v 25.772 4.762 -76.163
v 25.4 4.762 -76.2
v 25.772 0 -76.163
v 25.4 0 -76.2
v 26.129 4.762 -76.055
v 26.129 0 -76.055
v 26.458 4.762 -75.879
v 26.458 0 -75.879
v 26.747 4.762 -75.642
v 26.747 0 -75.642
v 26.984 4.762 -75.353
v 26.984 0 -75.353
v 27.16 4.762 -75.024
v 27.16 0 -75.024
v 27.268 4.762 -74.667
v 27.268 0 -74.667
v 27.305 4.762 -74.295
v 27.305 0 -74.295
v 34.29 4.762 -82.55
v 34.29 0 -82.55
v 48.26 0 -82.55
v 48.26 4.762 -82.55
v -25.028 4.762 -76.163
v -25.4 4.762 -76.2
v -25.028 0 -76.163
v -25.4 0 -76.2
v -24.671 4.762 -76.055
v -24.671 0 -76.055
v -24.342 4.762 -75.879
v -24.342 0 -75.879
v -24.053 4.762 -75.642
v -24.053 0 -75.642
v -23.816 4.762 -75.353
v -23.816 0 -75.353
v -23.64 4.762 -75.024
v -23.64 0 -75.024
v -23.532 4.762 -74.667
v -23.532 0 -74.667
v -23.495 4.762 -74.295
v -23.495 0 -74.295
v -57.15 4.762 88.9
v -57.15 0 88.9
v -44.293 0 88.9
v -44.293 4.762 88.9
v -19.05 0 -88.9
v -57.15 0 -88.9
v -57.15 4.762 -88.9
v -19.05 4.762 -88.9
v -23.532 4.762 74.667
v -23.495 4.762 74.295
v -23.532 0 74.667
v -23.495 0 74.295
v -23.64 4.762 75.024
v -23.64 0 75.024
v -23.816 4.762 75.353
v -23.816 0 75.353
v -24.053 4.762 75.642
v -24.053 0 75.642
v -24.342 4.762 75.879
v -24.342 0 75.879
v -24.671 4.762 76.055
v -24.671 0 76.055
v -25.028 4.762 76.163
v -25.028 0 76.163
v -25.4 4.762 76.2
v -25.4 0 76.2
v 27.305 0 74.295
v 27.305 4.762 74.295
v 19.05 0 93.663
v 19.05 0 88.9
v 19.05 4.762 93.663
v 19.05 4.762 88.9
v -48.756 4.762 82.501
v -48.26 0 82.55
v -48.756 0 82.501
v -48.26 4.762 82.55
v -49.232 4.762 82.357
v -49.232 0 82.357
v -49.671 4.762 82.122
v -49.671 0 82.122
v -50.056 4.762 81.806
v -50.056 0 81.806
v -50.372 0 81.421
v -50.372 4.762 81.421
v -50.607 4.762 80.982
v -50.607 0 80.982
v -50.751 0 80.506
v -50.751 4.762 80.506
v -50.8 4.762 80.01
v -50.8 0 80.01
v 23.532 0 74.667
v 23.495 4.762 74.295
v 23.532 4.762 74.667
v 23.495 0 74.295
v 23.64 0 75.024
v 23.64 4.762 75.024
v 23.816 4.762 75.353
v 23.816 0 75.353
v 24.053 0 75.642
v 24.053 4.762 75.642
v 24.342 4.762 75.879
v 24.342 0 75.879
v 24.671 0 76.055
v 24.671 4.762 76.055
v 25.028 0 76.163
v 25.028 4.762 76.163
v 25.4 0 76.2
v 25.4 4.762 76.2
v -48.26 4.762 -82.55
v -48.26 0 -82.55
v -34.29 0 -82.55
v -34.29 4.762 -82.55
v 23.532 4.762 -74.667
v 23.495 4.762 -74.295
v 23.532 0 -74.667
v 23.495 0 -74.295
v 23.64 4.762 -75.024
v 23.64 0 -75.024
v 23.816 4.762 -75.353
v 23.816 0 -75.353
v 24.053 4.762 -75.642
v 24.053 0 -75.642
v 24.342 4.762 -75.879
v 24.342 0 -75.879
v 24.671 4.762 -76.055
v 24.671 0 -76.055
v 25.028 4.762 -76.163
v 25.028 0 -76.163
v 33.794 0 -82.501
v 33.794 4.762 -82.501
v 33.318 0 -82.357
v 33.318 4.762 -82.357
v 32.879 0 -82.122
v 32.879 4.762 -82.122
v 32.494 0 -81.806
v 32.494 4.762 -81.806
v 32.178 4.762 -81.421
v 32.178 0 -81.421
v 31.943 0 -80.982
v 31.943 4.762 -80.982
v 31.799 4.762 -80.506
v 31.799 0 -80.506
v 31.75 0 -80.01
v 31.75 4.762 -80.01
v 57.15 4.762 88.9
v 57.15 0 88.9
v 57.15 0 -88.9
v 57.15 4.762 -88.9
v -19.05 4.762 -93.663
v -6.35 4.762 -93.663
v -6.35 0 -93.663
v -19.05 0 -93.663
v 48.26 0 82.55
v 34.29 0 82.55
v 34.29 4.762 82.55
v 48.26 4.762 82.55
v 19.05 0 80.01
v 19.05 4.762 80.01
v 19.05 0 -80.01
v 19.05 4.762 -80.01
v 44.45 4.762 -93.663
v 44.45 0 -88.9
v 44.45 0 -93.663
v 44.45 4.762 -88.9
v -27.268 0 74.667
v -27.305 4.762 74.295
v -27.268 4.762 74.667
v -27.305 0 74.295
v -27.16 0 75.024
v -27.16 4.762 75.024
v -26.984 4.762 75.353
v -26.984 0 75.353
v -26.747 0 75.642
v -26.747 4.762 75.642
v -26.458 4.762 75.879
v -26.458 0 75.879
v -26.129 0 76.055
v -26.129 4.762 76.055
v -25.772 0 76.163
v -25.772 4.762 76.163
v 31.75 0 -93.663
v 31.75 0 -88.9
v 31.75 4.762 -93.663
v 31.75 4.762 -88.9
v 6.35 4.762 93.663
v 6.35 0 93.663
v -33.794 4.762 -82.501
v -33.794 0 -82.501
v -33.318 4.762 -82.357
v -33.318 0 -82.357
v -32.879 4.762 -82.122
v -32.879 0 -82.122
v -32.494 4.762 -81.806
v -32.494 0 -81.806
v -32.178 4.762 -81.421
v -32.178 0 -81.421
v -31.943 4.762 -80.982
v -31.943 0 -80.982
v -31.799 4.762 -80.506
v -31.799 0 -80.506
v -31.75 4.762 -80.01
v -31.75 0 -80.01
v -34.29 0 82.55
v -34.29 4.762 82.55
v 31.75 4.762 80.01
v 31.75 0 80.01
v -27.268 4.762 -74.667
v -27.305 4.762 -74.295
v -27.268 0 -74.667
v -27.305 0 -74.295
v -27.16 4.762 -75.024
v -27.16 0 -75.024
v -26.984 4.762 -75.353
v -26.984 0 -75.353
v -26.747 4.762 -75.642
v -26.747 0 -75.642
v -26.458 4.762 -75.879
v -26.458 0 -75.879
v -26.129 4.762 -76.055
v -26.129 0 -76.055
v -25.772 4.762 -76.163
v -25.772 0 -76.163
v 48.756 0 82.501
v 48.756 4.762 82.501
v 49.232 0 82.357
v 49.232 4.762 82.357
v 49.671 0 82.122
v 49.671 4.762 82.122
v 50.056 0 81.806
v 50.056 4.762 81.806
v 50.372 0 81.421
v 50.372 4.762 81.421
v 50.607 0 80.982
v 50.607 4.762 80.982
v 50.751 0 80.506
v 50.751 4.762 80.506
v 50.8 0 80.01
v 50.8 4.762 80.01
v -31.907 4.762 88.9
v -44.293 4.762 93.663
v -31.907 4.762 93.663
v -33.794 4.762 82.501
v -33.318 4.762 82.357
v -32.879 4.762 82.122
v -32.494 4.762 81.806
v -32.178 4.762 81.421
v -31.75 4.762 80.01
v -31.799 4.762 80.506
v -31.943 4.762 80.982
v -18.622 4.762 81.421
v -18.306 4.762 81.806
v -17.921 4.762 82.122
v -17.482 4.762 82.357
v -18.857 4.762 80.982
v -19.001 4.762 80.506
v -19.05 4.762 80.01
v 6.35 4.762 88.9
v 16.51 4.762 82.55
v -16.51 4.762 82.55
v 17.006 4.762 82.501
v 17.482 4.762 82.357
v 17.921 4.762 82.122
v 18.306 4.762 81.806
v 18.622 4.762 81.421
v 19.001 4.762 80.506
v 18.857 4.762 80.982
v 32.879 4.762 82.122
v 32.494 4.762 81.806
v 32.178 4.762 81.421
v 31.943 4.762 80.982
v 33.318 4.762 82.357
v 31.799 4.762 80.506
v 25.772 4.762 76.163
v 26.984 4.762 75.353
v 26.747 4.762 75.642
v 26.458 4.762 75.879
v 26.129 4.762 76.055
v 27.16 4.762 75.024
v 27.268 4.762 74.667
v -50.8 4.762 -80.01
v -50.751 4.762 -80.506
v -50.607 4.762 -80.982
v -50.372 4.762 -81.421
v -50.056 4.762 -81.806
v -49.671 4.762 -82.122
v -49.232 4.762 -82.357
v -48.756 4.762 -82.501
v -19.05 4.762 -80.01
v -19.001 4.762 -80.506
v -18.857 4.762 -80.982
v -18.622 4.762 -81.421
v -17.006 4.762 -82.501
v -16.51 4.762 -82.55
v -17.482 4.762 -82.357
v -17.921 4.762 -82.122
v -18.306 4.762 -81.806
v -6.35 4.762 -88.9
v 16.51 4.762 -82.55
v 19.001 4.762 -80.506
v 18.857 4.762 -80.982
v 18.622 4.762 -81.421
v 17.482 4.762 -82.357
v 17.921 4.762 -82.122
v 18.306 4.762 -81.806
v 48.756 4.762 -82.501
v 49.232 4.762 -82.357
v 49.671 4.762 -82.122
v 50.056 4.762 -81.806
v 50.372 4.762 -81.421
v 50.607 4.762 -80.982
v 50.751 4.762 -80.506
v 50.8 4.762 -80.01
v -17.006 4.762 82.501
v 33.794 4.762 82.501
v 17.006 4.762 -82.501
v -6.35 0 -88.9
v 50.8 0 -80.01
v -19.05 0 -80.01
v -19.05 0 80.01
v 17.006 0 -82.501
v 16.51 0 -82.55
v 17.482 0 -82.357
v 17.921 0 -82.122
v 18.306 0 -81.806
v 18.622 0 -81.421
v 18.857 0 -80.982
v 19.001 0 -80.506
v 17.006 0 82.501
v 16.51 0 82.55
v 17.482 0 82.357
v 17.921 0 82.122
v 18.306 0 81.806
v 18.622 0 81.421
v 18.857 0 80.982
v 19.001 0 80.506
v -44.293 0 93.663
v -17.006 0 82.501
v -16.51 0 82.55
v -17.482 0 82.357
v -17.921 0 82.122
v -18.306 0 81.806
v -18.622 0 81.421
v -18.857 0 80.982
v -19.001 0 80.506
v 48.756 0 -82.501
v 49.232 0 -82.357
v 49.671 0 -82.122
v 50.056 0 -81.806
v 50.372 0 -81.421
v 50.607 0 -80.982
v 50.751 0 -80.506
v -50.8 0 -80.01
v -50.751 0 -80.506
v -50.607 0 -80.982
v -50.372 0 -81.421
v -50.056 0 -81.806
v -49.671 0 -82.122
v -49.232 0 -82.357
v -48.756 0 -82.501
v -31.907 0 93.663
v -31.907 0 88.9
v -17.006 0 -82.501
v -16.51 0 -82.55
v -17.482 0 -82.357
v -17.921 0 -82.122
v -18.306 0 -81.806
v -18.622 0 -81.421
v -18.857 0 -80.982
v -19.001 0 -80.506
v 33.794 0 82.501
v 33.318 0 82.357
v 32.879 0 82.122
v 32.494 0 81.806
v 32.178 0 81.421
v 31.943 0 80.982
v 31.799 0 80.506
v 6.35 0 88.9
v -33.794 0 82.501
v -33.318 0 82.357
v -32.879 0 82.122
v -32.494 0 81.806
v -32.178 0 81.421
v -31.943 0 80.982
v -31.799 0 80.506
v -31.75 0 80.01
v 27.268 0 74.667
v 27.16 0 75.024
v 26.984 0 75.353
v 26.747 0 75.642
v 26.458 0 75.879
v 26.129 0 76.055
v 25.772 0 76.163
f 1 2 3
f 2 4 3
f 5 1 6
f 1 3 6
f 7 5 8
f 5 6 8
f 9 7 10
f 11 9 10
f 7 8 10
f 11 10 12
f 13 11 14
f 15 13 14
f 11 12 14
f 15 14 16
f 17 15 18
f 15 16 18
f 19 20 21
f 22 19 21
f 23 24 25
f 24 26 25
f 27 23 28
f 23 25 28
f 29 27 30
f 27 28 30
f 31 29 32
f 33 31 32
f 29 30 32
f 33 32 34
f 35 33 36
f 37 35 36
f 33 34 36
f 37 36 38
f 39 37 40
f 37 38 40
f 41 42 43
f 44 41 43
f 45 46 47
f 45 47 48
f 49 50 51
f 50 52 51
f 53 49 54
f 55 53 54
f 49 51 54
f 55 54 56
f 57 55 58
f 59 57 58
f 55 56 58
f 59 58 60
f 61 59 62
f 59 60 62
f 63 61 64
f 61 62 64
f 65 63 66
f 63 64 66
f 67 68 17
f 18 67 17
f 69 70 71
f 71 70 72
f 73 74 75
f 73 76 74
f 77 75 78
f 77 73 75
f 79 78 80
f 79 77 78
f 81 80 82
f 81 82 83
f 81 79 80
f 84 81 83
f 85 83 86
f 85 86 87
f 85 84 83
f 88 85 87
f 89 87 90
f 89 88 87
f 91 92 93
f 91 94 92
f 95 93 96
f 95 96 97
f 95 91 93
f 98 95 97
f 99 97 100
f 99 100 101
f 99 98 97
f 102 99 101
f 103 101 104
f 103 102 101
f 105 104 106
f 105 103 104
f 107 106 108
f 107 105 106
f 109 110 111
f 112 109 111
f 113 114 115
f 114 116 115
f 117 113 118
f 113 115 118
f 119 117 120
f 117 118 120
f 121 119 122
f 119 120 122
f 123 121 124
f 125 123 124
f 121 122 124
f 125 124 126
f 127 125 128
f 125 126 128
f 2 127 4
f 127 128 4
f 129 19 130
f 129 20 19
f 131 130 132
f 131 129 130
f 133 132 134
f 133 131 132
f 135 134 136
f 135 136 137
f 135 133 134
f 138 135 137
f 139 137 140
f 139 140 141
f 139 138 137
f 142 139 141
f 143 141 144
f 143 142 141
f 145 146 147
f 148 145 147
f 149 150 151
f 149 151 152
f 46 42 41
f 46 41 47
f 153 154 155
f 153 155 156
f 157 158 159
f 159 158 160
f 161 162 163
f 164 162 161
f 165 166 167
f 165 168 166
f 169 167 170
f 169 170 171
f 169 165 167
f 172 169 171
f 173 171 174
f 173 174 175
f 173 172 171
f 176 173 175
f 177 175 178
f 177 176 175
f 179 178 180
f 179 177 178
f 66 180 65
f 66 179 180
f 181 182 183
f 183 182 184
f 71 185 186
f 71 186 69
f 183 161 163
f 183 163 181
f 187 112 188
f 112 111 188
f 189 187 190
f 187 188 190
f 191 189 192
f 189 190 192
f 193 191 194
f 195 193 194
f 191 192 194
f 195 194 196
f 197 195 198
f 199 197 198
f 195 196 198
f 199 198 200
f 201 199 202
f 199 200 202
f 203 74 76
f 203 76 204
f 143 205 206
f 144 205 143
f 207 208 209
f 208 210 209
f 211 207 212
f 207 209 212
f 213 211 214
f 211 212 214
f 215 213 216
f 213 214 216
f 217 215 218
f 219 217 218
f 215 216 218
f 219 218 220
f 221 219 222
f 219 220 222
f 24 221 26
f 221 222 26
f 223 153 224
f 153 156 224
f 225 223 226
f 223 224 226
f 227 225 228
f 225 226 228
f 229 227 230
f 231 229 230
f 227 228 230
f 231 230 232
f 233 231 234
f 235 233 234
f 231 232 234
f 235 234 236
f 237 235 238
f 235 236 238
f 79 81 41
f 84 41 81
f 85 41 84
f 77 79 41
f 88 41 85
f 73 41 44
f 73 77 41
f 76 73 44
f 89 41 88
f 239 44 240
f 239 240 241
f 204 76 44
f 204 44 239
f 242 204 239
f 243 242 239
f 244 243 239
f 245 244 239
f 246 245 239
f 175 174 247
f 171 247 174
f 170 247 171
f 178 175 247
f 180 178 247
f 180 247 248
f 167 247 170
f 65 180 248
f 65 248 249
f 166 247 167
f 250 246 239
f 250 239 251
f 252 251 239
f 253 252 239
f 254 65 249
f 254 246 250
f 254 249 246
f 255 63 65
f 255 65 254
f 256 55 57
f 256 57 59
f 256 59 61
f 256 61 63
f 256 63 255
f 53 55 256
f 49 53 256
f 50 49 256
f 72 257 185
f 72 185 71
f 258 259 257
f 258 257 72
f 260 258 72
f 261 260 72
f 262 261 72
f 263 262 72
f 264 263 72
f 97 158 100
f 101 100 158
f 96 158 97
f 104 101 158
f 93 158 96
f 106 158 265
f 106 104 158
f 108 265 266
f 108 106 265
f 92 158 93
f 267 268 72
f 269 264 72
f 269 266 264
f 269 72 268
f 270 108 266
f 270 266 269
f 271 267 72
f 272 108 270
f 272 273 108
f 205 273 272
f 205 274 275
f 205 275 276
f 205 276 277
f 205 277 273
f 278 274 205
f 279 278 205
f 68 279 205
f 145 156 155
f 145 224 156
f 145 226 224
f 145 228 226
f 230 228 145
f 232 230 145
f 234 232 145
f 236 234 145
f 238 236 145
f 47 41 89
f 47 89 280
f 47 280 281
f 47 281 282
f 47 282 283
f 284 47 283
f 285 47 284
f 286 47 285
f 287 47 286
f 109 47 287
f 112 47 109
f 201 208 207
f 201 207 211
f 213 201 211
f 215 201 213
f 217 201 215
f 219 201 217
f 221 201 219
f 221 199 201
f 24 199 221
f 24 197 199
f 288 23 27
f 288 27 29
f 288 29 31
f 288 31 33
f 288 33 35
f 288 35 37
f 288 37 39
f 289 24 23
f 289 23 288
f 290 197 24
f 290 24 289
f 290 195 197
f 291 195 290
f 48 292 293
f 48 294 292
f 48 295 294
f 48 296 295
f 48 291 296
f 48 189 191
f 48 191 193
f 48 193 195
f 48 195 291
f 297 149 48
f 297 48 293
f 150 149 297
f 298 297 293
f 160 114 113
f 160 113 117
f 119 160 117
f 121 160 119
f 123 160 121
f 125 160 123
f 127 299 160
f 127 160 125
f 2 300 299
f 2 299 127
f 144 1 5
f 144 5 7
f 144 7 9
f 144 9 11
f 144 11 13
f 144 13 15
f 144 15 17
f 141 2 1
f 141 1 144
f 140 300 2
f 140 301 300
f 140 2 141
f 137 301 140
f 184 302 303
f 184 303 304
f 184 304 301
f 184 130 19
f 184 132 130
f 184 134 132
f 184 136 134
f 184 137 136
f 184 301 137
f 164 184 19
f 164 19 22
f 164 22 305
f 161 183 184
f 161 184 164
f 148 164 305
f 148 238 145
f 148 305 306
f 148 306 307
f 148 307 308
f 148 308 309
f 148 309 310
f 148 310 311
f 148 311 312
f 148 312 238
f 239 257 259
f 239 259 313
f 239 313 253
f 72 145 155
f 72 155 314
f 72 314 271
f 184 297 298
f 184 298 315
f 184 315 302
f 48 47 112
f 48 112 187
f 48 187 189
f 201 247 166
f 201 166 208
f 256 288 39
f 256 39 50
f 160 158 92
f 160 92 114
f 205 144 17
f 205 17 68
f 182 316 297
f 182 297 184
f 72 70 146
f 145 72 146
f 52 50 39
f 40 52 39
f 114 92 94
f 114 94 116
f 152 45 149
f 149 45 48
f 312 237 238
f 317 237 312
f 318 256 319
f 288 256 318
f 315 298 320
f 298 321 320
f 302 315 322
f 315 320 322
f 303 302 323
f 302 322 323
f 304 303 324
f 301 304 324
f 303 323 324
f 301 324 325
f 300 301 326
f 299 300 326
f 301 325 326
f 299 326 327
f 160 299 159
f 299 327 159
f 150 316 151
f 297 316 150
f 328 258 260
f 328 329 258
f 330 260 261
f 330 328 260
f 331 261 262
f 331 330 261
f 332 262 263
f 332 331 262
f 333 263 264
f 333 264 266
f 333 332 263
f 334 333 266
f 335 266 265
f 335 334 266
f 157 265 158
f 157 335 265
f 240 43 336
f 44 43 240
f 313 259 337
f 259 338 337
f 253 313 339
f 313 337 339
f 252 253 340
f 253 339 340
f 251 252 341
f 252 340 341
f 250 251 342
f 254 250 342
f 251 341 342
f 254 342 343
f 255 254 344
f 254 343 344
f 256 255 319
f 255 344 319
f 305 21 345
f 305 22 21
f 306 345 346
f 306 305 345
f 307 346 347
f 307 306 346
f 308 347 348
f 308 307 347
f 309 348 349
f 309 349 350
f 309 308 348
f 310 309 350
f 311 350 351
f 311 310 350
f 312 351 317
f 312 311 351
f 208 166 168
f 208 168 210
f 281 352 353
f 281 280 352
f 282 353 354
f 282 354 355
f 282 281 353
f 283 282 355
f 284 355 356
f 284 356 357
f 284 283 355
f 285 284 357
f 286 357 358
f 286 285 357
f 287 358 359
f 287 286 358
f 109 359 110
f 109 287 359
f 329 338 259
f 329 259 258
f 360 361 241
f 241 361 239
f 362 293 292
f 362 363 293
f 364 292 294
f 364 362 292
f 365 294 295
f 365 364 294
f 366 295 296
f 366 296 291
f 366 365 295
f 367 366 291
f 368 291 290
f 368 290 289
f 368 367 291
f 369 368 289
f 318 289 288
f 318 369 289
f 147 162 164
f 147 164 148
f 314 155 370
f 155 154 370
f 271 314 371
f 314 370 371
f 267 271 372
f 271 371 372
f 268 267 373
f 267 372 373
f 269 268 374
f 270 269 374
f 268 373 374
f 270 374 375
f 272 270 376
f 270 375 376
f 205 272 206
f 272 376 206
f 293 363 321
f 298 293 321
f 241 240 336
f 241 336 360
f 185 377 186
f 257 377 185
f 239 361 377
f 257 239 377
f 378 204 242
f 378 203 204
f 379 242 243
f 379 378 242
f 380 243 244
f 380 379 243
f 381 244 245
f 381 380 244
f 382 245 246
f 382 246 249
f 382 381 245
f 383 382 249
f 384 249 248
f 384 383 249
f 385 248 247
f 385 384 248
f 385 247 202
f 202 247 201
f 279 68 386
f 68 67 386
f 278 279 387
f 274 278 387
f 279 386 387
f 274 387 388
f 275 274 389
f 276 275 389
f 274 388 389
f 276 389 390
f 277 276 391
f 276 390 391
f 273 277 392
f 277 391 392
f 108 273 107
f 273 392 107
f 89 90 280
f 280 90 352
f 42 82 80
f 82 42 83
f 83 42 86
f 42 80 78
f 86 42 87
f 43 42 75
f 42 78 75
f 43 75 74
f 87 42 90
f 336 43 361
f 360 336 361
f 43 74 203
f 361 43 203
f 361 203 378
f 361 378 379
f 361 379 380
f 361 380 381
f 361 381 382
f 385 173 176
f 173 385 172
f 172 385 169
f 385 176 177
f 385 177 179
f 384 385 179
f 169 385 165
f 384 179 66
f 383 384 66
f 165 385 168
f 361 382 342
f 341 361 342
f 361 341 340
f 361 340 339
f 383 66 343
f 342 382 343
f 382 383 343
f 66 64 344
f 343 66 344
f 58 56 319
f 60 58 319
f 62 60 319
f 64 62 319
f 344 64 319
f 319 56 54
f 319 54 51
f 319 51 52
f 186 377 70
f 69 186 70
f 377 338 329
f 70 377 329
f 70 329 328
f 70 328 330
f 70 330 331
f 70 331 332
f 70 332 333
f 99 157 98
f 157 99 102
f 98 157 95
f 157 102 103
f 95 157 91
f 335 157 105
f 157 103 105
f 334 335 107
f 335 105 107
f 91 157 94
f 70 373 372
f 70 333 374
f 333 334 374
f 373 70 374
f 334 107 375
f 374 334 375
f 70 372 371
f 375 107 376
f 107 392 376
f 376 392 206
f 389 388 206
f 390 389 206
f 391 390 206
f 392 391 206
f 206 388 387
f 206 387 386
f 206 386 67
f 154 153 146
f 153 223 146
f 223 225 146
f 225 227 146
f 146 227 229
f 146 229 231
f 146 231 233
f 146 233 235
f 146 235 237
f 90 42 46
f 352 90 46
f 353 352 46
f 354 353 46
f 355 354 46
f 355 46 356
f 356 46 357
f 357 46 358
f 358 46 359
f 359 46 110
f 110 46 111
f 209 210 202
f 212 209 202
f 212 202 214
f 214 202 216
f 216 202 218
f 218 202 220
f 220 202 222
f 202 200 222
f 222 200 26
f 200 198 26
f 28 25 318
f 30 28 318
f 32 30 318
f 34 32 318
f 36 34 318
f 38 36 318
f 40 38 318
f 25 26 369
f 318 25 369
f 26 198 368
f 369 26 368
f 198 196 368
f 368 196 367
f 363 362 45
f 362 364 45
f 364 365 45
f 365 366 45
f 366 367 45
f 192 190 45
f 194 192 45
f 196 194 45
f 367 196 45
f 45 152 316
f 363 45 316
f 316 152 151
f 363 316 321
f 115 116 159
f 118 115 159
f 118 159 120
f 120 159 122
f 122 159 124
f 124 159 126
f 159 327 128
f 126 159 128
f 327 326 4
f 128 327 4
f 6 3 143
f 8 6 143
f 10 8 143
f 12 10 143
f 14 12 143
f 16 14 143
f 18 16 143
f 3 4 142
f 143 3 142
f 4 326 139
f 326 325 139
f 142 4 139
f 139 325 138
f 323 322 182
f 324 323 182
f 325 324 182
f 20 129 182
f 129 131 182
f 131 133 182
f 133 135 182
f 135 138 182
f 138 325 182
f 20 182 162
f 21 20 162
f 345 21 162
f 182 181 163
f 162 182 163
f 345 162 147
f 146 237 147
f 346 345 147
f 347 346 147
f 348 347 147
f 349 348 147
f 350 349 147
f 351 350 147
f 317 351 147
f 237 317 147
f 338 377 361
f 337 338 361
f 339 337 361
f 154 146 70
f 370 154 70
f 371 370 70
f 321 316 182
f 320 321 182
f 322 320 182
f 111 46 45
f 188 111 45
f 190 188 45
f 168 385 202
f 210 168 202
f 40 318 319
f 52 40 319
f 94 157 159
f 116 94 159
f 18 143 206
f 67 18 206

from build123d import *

# Parameters (mm, degrees)
SKETCH1_W           = 114.3
SKETCH1_H           = 177.8
SKETCH1_W_2         = 101.6
SKETCH1_H_2         = 165.1
BOSS_EXTRUDE1_DEPTH = 4.7625
SKETCH2_W           = 12.38677804
SKETCH2_H           = 4.7625
SKETCH2_W_2         = 12.7
BOSS_EXTRUDE2_DEPTH = 4.7625
SKETCH3_W           = 12.7
SKETCH3_H           = 4.7625
BOSS_EXTRUDE3_DEPTH = 4.7625
FILLET1_R           = 2.54
SKETCH7_W           = 12.7
SKETCH7_H           = 165.1
SKETCH7_W_2         = 3.81
SKETCH7_H_2         = 152.4
BOSS_EXTRUDE6_DEPTH = 4.7625
FILLET3_R           = 2.54
FILLET4_R           = 1.905


with BuildPart() as part:
    # Sketch1 → Boss-Extrude1 (new body)
    with BuildSketch(Plane(origin=(0, 0, 0), x_dir=(1, 0, 0), z_dir=(0, 1, 0))):
        Rectangle(SKETCH1_W, SKETCH1_H)
        Rectangle(SKETCH1_W_2, SKETCH1_H_2, mode=Mode.SUBTRACT)
    extrude(amount=BOSS_EXTRUDE1_DEPTH)

    # Sketch2 → Boss-Extrude2 (add)
    with BuildSketch(Plane.XY.offset(88.9)):
        with Locations((-38.1, 2.38125)):
            Rectangle(SKETCH2_W, SKETCH2_H)
        with Locations((12.7, 2.38125)):
            Rectangle(SKETCH2_W_2, SKETCH2_H)
    extrude(amount=BOSS_EXTRUDE2_DEPTH)

    # Sketch3 → Boss-Extrude3 (add)
    with BuildSketch(Plane(origin=(0, 0, -88.9), x_dir=(-1, 0, 0), z_dir=(0, 0, -1))):
        with Locations((-38.1, 2.38125)):
            Rectangle(SKETCH3_W, SKETCH3_H)
        with Locations((12.7, 2.38125)):
            Rectangle(SKETCH3_W, SKETCH3_H)
    extrude(amount=BOSS_EXTRUDE3_DEPTH)

    # Fillet1
    fillet1_edges = [part.edges().sort_by_distance(p)[0] for p in [
        (50.8, 2.38125, 82.55),
        (50.8, 2.38125, -82.55),
        (-50.8, 2.38125, -82.55),
        (-50.8, 2.38125, 82.55),
    ]]
    fillet(fillet1_edges, radius=FILLET1_R)

    # Sketch7 → Boss-Extrude6 (add)
    # profile 1 of 2: a face of its own
    with BuildSketch(Plane(origin=(0, 4.7625, 0), x_dir=(1, 0, 0), z_dir=(0, 1, 0))):
        with Locations((-25.4, 0)):
            Rectangle(SKETCH7_W, SKETCH7_H)
        with Locations((-25.4, 0)):
            Rectangle(SKETCH7_W_2, SKETCH7_H_2, mode=Mode.SUBTRACT)
    # profile 2 of 2: a face of its own
    with BuildSketch(Plane(origin=(0, 4.7625, 0), x_dir=(1, 0, 0), z_dir=(0, 1, 0))):
        with Locations((25.4, 0)):
            Rectangle(SKETCH7_W, SKETCH7_H)
        with Locations((25.4, 0)):
            Rectangle(SKETCH7_W_2, SKETCH7_H_2, mode=Mode.SUBTRACT)
    extrude(amount=-BOSS_EXTRUDE6_DEPTH)

    # Fillet3
    fillet3_edges = [part.edges().sort_by_distance(p)[0] for p in [
        (-31.75, 2.38125, 82.55),
        (-31.75, 2.38125, -82.55),
        (-19.05, 2.38125, -82.55),
        (-19.05, 2.38125, 82.55),
        (19.05, 2.38125, 82.55),
        (19.05, 2.38125, -82.55),
        (31.75, 2.38125, -82.55),
        (31.75, 2.38125, 82.55),
    ]]
    fillet(fillet3_edges, radius=FILLET3_R)

    # Fillet4
    fillet4_edges = [part.edges().sort_by_distance(p)[0] for p in [
        (27.305, 2.38125, -76.2),
        (23.495, 2.38125, -76.2),
        (27.305, 2.38125, 76.2),
        (23.495, 2.38125, 76.2),
        (-23.495, 2.38125, 76.2),
        (-27.305, 2.38125, 76.2),
        (-23.495, 2.38125, -76.2),
        (-27.305, 2.38125, -76.2),
    ]]
    fillet(fillet4_edges, radius=FILLET4_R - 0.0001)  # a hair under: the kernel refuses the full size


solid = part.part
